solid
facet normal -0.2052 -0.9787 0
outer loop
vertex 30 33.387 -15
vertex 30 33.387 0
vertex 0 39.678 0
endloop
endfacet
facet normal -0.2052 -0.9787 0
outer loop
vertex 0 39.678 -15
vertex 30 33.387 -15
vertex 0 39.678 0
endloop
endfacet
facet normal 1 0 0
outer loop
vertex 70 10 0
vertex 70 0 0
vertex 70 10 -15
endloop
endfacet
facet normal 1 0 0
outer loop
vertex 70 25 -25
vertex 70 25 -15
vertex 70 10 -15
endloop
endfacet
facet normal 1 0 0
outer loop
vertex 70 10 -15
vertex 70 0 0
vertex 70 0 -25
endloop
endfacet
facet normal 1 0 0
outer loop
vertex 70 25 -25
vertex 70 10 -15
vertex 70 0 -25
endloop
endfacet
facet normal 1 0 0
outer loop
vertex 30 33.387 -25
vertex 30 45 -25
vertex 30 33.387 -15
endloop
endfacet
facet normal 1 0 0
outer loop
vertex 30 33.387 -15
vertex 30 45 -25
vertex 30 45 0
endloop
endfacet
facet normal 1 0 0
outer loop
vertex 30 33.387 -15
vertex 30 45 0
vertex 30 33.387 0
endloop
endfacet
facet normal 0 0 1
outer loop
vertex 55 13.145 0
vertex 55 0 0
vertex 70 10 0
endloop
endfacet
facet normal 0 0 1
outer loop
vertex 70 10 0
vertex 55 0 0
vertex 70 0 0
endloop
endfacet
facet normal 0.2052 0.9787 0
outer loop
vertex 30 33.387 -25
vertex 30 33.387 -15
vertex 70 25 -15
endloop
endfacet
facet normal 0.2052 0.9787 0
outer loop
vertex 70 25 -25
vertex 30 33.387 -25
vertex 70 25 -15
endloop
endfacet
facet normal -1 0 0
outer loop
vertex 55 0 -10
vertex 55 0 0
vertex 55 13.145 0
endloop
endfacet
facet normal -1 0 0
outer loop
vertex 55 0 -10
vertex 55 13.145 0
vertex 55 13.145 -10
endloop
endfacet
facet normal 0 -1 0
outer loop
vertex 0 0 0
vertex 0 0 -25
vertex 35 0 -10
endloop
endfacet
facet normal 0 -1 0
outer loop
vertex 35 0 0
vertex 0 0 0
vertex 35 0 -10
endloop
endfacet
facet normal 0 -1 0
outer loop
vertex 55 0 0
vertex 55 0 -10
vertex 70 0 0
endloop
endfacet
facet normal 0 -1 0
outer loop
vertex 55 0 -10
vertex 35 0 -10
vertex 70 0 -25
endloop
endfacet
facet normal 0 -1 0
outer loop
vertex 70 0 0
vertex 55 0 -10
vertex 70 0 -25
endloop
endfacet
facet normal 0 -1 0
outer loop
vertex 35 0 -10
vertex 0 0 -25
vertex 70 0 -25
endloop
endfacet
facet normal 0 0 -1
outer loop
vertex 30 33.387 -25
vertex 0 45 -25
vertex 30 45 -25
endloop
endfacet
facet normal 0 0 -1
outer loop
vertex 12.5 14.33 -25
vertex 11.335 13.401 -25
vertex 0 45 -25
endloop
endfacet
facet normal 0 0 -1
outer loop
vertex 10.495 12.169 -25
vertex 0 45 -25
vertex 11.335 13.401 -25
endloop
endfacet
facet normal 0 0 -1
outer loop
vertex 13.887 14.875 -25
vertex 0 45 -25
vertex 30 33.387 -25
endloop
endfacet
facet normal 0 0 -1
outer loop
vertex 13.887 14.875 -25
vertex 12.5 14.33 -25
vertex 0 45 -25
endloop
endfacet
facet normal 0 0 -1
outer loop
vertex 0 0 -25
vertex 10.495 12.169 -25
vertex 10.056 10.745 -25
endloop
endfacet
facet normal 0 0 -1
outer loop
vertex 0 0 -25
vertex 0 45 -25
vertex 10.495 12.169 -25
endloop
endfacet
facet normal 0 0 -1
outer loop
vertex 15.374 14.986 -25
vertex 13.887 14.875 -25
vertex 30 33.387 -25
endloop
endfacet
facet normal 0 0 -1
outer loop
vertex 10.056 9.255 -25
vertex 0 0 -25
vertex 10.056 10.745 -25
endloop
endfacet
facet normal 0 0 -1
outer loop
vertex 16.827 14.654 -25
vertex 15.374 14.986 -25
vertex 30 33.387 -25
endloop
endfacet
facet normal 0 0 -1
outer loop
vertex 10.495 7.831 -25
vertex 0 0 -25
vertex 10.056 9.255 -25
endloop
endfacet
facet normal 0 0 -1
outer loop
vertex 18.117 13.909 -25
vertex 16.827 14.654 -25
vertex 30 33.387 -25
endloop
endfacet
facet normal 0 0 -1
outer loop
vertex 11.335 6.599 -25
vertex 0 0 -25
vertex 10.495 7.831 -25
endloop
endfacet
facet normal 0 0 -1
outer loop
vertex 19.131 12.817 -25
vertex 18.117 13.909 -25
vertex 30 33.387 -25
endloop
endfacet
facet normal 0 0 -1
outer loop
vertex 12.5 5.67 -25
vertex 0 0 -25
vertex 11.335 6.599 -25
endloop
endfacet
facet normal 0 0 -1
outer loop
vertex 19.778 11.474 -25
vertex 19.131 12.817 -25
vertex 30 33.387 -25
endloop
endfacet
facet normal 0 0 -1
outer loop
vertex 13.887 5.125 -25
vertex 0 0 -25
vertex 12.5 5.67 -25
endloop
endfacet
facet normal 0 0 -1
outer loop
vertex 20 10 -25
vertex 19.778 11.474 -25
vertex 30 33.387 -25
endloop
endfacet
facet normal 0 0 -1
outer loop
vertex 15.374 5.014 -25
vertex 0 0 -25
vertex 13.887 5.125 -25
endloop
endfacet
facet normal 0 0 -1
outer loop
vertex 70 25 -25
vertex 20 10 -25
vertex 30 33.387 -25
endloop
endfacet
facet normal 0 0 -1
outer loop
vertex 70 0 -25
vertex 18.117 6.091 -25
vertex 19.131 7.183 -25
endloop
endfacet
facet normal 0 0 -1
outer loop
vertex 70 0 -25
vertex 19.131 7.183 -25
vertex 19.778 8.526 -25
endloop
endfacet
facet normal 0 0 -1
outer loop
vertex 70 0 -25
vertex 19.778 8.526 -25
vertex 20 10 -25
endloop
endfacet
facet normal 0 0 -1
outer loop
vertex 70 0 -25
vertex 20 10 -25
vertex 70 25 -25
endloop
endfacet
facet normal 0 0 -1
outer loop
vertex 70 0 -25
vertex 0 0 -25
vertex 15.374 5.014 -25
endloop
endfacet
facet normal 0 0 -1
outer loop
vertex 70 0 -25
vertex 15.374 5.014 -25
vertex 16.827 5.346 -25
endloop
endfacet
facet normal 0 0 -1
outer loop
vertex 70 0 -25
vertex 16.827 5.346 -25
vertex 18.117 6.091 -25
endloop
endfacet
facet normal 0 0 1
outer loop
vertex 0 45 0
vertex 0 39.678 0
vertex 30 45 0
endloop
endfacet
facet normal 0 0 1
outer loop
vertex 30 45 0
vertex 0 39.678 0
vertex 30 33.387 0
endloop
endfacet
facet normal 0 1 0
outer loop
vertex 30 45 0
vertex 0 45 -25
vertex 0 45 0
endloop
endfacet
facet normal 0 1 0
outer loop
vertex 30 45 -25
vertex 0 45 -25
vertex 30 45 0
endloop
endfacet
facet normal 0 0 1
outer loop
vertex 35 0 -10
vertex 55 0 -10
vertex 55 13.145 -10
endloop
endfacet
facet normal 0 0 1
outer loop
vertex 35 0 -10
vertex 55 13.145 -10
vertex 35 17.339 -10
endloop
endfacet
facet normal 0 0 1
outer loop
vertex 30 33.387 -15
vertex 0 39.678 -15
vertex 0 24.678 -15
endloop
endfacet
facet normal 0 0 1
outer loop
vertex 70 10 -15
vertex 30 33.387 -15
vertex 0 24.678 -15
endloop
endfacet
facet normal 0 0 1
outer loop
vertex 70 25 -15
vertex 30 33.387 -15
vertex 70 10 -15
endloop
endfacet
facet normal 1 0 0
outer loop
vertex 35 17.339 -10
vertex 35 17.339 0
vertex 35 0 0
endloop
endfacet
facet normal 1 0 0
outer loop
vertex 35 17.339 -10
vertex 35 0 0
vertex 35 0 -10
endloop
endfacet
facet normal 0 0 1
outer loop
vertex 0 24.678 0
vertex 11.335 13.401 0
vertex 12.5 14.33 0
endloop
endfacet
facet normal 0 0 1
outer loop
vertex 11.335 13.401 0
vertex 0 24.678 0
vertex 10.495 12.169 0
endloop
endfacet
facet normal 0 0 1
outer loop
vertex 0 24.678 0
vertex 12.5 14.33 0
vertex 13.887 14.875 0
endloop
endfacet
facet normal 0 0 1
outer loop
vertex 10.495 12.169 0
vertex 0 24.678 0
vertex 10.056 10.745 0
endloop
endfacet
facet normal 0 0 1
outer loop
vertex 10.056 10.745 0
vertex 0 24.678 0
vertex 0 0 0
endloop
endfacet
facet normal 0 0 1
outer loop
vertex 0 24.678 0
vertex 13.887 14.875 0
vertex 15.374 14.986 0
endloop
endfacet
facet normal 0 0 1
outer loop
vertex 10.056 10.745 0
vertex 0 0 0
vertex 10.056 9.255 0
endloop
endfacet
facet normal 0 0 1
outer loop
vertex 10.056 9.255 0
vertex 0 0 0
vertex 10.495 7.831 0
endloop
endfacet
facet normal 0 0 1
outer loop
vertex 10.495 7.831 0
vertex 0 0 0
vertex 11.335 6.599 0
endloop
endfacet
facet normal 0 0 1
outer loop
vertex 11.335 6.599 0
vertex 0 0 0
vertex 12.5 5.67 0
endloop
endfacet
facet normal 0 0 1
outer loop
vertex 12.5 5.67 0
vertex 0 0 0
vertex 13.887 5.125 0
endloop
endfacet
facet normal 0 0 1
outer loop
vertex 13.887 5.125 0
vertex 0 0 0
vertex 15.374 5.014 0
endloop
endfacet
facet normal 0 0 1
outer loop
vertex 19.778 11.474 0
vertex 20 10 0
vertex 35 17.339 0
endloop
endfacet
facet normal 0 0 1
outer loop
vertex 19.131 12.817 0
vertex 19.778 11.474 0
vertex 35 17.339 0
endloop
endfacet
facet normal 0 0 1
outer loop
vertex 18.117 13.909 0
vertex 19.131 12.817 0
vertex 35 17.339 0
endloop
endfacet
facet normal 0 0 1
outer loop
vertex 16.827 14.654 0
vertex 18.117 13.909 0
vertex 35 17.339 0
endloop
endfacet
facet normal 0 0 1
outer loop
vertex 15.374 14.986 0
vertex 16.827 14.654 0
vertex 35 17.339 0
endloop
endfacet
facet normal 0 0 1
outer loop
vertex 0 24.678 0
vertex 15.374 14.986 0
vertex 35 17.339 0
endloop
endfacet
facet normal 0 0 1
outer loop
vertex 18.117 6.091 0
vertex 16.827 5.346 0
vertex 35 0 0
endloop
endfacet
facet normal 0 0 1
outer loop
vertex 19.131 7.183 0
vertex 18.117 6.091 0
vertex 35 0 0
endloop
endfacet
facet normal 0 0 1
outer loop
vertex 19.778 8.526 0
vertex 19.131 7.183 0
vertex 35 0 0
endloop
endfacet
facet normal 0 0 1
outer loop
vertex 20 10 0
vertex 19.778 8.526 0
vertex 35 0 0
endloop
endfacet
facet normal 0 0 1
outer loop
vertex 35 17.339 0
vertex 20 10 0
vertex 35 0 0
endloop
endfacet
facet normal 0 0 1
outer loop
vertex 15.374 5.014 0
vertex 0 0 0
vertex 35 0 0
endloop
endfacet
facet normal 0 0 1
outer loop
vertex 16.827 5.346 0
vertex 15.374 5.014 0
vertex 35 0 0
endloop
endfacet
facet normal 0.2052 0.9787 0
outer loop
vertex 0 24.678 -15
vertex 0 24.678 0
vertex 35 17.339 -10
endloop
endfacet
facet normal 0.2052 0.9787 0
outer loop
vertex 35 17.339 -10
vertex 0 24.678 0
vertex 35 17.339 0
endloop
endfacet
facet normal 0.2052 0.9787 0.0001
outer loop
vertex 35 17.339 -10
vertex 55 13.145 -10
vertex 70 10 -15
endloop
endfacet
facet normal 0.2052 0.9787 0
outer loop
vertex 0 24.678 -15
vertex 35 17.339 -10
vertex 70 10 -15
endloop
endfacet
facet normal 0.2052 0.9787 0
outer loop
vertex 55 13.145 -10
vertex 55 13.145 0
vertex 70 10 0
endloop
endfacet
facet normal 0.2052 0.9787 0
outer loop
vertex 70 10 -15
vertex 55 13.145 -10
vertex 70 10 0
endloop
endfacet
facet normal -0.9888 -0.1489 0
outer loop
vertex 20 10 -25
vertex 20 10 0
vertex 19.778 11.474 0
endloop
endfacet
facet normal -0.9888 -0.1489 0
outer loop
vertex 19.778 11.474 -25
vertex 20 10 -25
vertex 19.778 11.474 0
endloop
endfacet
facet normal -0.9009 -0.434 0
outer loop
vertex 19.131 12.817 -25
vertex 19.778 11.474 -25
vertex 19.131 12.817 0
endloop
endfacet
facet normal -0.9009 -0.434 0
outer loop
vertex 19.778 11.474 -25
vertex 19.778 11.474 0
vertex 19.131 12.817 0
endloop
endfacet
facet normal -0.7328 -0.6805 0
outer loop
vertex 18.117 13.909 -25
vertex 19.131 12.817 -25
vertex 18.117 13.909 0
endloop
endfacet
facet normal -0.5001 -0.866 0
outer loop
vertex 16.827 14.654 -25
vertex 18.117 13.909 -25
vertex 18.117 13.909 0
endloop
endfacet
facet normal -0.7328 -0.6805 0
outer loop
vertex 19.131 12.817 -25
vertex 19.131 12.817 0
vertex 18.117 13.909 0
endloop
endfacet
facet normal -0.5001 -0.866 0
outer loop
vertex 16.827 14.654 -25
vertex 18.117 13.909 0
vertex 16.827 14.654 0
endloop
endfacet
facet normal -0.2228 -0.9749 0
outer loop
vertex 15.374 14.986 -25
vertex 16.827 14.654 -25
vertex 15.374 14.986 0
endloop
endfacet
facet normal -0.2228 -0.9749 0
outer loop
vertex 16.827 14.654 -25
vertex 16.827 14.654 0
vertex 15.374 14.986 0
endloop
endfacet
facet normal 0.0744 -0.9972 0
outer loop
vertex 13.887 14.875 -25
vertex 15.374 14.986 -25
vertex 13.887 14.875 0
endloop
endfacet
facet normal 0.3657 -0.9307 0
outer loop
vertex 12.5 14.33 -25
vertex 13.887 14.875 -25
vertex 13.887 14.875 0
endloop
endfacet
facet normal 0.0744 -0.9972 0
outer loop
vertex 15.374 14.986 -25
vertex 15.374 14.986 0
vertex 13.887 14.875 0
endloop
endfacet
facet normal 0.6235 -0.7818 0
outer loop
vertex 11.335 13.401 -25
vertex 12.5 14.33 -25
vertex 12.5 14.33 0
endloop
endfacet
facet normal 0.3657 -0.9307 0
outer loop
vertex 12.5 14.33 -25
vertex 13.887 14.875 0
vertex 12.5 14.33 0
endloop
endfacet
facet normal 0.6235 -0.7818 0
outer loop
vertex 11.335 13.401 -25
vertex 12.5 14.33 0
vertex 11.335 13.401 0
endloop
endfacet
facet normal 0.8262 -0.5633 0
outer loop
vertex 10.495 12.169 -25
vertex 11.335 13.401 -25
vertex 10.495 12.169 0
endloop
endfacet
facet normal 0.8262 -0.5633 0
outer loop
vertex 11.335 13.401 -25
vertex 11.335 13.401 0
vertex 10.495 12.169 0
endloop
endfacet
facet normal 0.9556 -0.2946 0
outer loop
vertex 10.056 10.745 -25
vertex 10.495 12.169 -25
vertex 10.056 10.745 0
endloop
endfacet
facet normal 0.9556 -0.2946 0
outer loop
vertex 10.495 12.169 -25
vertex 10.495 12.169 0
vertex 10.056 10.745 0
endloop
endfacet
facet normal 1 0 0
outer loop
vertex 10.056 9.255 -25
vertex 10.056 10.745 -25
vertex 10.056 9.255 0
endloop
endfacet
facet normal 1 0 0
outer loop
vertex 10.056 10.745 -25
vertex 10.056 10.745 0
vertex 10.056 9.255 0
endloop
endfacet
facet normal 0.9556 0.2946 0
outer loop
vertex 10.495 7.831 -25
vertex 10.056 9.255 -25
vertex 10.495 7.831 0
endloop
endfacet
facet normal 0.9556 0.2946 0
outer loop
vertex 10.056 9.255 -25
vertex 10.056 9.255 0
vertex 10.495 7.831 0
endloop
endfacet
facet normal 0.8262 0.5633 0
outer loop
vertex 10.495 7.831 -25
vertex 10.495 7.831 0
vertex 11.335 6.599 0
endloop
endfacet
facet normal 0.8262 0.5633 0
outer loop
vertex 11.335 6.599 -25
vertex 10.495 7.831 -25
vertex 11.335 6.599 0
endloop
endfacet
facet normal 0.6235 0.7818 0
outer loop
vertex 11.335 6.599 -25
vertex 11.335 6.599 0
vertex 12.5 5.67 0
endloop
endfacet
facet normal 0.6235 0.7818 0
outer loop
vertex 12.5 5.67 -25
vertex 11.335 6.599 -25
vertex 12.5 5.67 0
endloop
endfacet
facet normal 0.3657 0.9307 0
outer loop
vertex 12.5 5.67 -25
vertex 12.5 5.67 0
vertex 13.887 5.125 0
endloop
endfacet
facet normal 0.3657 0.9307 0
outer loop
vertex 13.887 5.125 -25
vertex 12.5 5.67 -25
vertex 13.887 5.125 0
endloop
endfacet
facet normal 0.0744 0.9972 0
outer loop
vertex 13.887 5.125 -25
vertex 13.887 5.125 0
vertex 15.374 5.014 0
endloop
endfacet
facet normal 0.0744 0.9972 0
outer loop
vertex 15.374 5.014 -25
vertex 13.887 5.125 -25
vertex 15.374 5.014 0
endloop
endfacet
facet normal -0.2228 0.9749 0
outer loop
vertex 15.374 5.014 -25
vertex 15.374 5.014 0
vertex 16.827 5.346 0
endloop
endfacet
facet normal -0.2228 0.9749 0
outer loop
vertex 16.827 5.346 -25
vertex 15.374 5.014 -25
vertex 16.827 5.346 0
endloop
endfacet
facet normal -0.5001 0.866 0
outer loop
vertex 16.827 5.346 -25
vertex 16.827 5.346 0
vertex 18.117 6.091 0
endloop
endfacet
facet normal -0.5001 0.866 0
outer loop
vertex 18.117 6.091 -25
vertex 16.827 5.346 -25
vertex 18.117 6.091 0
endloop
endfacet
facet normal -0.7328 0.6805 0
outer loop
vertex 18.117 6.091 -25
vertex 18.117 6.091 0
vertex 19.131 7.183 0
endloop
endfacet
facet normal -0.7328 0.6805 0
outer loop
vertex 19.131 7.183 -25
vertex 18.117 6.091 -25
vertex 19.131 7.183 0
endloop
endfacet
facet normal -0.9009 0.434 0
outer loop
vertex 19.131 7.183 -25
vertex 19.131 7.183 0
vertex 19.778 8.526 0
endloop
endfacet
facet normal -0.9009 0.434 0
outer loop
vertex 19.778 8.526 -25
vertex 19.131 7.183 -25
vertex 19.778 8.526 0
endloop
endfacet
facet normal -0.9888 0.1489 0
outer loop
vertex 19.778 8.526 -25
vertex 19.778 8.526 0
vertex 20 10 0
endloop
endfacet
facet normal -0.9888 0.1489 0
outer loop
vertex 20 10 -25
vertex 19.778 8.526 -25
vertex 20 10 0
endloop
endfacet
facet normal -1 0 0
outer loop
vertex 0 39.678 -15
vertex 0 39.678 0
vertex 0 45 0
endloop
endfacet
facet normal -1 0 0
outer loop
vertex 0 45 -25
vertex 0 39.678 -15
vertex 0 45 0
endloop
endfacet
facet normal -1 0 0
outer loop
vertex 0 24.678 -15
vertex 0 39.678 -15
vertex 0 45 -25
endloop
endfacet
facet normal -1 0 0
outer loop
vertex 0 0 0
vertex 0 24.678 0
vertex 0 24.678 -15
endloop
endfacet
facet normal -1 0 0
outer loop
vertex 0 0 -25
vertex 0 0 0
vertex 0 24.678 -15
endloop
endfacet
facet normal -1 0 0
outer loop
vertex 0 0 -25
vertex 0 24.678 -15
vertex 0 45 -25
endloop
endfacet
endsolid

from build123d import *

# Parameters (mm, degrees)
SKETCH1_W           = 70
SKETCH1_H           = 25
BOSS_EXTRUDE1_DEPTH = 45
CUT_EXTRUDE1_DEPTH  = 15
CUT_EXTRUDE2_DEPTH  = 26
SKETCH4_W           = 20
SKETCH4_H           = 10
CUT_EXTRUDE3_DEPTH  = 46
SKETCH5_R           = 5
CUT_EXTRUDE4_DEPTH  = 26


with BuildPart() as part:
    # Sketch1 → Boss-Extrude1 (new body)
    with BuildSketch(Plane(origin=(0, 0, 0), x_dir=(1, 0, 0), z_dir=(0, 1, 0))):
        with Locations((35, 12.5)):
            Rectangle(SKETCH1_W, SKETCH1_H)
    extrude(amount=BOSS_EXTRUDE1_DEPTH)

    # Sketch2 → Cut-Extrude1 (cut)
    with BuildSketch(Plane.XY):
        Polygon((0, 39.67789539), (0, 24.67789539), (70, 10), (70, 25), align=None)
    extrude(amount=-CUT_EXTRUDE1_DEPTH, mode=Mode.SUBTRACT)

    # Sketch3 → Cut-Extrude2 (cut, through all)
    with BuildSketch(Plane.XY):
        Polygon((30, 45), (30, 33.387368794), (70, 25), (70, 45), align=None)
    extrude(amount=-CUT_EXTRUDE2_DEPTH, mode=Mode.SUBTRACT)

    # Sketch4 → Cut-Extrude3 (cut, through all)
    with BuildSketch(Plane(origin=(0, 0, 0), x_dir=(-1, 0, 0), z_dir=(0, -1, 0))):
        with Locations((-45, 5)):
            Rectangle(SKETCH4_W, SKETCH4_H)
    extrude(amount=-CUT_EXTRUDE3_DEPTH, mode=Mode.SUBTRACT)

    # Sketch5 → Cut-Extrude4 (cut, through all)
    with BuildSketch(Plane.XY):
        with Locations((15, 10)):
            Circle(SKETCH5_R)
    extrude(amount=-CUT_EXTRUDE4_DEPTH, mode=Mode.SUBTRACT)


solid = part.part
